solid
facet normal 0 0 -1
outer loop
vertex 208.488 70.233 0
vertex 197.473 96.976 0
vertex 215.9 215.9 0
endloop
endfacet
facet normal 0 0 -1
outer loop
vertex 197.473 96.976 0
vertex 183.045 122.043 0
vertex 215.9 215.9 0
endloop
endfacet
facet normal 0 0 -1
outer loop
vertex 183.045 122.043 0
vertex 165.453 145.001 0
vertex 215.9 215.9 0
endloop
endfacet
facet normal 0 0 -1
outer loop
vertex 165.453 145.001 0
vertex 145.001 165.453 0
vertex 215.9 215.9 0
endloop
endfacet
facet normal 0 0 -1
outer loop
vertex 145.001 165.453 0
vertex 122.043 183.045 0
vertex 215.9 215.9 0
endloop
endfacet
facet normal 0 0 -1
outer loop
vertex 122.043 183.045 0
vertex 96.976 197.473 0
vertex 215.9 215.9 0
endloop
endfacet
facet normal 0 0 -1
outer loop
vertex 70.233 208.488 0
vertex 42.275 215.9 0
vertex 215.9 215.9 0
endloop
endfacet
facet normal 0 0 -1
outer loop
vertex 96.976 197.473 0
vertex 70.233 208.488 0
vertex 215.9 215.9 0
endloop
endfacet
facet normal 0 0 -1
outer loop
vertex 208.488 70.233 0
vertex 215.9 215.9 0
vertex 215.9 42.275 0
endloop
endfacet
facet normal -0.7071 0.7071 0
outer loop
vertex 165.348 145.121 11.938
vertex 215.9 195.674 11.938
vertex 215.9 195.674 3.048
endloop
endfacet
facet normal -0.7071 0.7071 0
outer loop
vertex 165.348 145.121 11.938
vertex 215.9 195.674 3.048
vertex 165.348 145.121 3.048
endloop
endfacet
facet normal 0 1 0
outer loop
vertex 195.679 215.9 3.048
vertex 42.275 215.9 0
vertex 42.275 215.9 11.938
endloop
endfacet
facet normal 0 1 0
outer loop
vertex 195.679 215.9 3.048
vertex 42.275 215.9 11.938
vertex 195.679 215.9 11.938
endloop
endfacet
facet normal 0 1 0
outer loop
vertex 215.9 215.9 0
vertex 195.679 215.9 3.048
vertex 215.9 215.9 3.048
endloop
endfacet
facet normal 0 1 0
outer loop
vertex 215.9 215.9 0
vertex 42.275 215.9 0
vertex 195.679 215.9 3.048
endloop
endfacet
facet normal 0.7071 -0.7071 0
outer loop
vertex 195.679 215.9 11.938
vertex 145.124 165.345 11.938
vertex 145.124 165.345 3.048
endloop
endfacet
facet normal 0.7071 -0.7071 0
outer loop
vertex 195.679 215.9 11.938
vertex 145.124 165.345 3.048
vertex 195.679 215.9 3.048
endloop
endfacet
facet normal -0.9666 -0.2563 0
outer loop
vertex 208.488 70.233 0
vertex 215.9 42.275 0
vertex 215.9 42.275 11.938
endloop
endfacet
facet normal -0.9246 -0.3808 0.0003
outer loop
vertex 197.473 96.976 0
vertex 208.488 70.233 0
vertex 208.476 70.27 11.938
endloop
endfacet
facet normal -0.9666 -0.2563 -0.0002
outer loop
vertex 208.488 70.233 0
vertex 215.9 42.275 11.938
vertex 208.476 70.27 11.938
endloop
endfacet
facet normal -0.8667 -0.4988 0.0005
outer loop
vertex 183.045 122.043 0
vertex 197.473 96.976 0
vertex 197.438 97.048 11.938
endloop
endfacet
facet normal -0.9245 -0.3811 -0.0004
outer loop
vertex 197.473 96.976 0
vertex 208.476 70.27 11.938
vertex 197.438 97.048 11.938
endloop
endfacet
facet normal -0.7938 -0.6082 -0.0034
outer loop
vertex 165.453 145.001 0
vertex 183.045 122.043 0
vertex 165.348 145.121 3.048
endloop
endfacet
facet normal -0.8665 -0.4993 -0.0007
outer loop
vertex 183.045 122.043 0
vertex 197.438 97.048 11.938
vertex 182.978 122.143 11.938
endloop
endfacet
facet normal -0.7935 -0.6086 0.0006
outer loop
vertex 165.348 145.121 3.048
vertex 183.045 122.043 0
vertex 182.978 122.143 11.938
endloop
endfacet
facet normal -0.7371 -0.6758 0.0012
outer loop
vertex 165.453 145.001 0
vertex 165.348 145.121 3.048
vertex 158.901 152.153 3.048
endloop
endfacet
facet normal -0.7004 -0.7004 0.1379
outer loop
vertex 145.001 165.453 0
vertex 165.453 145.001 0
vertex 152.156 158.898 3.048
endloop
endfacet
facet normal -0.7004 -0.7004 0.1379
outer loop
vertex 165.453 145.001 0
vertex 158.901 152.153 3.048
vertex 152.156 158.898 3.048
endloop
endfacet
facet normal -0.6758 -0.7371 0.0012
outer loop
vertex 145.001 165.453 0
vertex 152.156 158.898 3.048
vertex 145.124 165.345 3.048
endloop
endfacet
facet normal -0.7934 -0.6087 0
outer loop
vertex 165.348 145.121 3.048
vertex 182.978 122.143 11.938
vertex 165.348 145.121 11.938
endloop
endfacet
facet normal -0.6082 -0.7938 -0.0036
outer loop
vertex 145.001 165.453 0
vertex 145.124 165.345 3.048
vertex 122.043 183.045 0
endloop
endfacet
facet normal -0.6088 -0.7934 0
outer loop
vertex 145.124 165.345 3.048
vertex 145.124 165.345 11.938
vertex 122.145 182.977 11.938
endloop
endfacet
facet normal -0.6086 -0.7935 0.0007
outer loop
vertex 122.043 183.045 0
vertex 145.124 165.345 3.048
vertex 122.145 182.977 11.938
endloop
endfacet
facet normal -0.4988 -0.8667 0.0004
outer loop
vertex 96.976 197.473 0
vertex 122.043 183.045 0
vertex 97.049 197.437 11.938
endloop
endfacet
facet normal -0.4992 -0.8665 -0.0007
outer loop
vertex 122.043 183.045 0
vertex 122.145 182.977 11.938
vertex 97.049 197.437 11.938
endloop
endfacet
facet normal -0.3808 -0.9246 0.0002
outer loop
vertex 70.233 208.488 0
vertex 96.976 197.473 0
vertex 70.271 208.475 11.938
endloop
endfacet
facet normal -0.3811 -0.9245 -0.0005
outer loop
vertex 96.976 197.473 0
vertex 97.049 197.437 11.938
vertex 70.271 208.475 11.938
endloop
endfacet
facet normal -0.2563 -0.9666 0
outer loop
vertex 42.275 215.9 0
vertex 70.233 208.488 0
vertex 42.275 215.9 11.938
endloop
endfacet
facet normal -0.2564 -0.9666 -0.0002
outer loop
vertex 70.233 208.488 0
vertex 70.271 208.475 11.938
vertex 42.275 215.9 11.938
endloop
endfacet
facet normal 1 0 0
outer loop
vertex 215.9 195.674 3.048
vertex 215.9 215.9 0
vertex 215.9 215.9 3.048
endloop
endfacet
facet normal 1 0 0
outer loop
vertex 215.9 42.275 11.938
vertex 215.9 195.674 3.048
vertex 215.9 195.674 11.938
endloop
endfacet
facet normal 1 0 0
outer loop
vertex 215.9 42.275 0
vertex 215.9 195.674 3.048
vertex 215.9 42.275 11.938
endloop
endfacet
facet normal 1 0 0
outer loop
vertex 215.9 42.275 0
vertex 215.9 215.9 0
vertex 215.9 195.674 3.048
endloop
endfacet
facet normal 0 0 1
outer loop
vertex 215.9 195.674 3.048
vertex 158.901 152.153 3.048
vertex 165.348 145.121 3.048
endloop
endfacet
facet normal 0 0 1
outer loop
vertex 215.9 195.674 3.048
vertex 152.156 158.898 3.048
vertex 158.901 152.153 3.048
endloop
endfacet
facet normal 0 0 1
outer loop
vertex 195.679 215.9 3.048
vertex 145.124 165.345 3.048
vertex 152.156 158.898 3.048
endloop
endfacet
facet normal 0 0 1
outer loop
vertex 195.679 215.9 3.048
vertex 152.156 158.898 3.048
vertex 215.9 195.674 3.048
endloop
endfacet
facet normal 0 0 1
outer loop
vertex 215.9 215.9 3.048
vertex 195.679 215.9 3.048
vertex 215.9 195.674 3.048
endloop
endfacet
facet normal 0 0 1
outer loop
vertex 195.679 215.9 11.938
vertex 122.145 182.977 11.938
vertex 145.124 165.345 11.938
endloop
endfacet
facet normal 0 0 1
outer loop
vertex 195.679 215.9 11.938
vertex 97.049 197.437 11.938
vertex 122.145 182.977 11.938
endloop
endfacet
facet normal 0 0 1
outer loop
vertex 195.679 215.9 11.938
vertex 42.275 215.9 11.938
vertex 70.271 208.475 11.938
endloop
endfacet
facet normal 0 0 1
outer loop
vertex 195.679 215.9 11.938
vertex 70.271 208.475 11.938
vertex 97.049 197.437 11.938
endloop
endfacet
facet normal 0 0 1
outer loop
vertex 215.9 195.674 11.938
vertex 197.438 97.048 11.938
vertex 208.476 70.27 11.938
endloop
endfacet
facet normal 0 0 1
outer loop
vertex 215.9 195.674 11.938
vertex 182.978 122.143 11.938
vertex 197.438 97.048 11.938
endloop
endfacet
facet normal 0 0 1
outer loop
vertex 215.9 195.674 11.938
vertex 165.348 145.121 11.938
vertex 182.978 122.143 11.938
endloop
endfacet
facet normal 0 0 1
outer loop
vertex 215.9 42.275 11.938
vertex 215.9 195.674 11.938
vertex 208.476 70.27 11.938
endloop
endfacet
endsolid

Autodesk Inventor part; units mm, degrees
ref_plane "YZ Plane" through (0, 0, 0) normal (1, 0, 0) x (0, 1, 0)
ref_plane "XZ Plane" through (0, 0, 0) normal (0, 1, 0) x (-1, 0, 0)
ref_plane "XY Plane" through (0, 0, 0) normal (0, 0, 1) x (1, 0, 0)
sketch "Sketch1" plane through (0, 0, 0) normal (0, 0, 1) x (1, 0, 0)
  circle A0 centre (0, 0) radius 215.9
  line L0 (-215.9, 215.9) -> (215.9, 215.9)
  line L1 (215.9, 215.9) -> (215.9, -215.9)
  line L2 (215.9, -215.9) -> (-215.9, -215.9)
  line L3 (-215.9, -215.9) -> (-215.9, 215.9)
  point P0 (215.9, 0)
  point P1 (0, 215.9)
  dimension "d0" = 431.8
  dimension "d1" = 431.8
  dimension "d2" = 431.8
  dimension "d3" = 215.9
  dimension "d4" = 215.9
extrude "Extrusion1" add sketch "Sketch1" along normal blind 11.938 contours A0 L0 L1
sketch "Sketch2" plane through (0, 0, 11.938) normal (0, 0, 1) x (1, 0, 0)
  circle A0 centre (0, 0) radius 220
  dimension "d7" = 440
extrude "Extrusion2" cut sketch "Sketch2" against normal through all
sketch "Sketch3" plane through (0, 0, 11.938) normal (0, 0, 1) x (1, 0, 0)
  line L0 (215.9, 215.9) -> (42.2752, 215.9) projected
  line L1 (215.9, 215.9) -> (197.9422, 215.9)
  line L2 (215.9, 42.2752) -> (215.9, 215.9) projected
  line L3 (215.9, 215.9) -> (215.9, 197.9368)
  line L4 (215.9, 197.9368) -> (135.0791, 117.1158)
  line L5 (135.0791, 117.1158) -> (117.1185, 135.0763)
  line L6 (117.1185, 135.0763) -> (197.9422, 215.9)
  point P0 (0, 0)
  dimension "d10" = 25.4
  dimension "d11" = 135
  dimension "d12" = 135
  dimension "d13" = 17.9578
  dimension "d14" = 90
  dimension "d15" = 127
extrude "Extrusion3" cut sketch "Sketch3" against normal blind 8.89
sketch "Sketch5" plane through (0, 0, 11.938) normal (0, 0, 1) x (1, 0, 0)
  arc A0 (164.2856, 146.3224) -> (146.3253, 164.2831) centre (0, 0) ccw projected
  line L0 (215.9, 197.9368) -> (164.2856, 146.3224) projected
  line L1 (215.9, 215.9) -> (215.9, 197.9368) projected
  line L2 (197.9422, 215.9) -> (215.9, 215.9) projected
  line L3 (146.3253, 164.2831) -> (197.9422, 215.9) projected
  line L4 (137.2766, 157.4974) -> (211.5205, 231.7413)
  line L5 (211.5205, 231.7413) -> (233.2717, 213.0454)
  line L6 (233.2717, 213.0454) -> (157.5001, 137.2738)
  line L7 (157.5001, 137.2738) -> (137.2766, 157.4974)
  dimension "d22" = 90
  dimension "d25" = 4.32
  dimension "d26" = 1.6002
  dimension "d27" = 1.6002
extrude "Extrusion5" cut sketch "Sketch5" against normal up to surface (8.89 mm away) contours A0 L3 L2 L1 L0 | L4 L5 L6 L7
properties part number "Wind Tunnel Fan Shroud Corner Mod Strap" material "Wood (Oak)"
